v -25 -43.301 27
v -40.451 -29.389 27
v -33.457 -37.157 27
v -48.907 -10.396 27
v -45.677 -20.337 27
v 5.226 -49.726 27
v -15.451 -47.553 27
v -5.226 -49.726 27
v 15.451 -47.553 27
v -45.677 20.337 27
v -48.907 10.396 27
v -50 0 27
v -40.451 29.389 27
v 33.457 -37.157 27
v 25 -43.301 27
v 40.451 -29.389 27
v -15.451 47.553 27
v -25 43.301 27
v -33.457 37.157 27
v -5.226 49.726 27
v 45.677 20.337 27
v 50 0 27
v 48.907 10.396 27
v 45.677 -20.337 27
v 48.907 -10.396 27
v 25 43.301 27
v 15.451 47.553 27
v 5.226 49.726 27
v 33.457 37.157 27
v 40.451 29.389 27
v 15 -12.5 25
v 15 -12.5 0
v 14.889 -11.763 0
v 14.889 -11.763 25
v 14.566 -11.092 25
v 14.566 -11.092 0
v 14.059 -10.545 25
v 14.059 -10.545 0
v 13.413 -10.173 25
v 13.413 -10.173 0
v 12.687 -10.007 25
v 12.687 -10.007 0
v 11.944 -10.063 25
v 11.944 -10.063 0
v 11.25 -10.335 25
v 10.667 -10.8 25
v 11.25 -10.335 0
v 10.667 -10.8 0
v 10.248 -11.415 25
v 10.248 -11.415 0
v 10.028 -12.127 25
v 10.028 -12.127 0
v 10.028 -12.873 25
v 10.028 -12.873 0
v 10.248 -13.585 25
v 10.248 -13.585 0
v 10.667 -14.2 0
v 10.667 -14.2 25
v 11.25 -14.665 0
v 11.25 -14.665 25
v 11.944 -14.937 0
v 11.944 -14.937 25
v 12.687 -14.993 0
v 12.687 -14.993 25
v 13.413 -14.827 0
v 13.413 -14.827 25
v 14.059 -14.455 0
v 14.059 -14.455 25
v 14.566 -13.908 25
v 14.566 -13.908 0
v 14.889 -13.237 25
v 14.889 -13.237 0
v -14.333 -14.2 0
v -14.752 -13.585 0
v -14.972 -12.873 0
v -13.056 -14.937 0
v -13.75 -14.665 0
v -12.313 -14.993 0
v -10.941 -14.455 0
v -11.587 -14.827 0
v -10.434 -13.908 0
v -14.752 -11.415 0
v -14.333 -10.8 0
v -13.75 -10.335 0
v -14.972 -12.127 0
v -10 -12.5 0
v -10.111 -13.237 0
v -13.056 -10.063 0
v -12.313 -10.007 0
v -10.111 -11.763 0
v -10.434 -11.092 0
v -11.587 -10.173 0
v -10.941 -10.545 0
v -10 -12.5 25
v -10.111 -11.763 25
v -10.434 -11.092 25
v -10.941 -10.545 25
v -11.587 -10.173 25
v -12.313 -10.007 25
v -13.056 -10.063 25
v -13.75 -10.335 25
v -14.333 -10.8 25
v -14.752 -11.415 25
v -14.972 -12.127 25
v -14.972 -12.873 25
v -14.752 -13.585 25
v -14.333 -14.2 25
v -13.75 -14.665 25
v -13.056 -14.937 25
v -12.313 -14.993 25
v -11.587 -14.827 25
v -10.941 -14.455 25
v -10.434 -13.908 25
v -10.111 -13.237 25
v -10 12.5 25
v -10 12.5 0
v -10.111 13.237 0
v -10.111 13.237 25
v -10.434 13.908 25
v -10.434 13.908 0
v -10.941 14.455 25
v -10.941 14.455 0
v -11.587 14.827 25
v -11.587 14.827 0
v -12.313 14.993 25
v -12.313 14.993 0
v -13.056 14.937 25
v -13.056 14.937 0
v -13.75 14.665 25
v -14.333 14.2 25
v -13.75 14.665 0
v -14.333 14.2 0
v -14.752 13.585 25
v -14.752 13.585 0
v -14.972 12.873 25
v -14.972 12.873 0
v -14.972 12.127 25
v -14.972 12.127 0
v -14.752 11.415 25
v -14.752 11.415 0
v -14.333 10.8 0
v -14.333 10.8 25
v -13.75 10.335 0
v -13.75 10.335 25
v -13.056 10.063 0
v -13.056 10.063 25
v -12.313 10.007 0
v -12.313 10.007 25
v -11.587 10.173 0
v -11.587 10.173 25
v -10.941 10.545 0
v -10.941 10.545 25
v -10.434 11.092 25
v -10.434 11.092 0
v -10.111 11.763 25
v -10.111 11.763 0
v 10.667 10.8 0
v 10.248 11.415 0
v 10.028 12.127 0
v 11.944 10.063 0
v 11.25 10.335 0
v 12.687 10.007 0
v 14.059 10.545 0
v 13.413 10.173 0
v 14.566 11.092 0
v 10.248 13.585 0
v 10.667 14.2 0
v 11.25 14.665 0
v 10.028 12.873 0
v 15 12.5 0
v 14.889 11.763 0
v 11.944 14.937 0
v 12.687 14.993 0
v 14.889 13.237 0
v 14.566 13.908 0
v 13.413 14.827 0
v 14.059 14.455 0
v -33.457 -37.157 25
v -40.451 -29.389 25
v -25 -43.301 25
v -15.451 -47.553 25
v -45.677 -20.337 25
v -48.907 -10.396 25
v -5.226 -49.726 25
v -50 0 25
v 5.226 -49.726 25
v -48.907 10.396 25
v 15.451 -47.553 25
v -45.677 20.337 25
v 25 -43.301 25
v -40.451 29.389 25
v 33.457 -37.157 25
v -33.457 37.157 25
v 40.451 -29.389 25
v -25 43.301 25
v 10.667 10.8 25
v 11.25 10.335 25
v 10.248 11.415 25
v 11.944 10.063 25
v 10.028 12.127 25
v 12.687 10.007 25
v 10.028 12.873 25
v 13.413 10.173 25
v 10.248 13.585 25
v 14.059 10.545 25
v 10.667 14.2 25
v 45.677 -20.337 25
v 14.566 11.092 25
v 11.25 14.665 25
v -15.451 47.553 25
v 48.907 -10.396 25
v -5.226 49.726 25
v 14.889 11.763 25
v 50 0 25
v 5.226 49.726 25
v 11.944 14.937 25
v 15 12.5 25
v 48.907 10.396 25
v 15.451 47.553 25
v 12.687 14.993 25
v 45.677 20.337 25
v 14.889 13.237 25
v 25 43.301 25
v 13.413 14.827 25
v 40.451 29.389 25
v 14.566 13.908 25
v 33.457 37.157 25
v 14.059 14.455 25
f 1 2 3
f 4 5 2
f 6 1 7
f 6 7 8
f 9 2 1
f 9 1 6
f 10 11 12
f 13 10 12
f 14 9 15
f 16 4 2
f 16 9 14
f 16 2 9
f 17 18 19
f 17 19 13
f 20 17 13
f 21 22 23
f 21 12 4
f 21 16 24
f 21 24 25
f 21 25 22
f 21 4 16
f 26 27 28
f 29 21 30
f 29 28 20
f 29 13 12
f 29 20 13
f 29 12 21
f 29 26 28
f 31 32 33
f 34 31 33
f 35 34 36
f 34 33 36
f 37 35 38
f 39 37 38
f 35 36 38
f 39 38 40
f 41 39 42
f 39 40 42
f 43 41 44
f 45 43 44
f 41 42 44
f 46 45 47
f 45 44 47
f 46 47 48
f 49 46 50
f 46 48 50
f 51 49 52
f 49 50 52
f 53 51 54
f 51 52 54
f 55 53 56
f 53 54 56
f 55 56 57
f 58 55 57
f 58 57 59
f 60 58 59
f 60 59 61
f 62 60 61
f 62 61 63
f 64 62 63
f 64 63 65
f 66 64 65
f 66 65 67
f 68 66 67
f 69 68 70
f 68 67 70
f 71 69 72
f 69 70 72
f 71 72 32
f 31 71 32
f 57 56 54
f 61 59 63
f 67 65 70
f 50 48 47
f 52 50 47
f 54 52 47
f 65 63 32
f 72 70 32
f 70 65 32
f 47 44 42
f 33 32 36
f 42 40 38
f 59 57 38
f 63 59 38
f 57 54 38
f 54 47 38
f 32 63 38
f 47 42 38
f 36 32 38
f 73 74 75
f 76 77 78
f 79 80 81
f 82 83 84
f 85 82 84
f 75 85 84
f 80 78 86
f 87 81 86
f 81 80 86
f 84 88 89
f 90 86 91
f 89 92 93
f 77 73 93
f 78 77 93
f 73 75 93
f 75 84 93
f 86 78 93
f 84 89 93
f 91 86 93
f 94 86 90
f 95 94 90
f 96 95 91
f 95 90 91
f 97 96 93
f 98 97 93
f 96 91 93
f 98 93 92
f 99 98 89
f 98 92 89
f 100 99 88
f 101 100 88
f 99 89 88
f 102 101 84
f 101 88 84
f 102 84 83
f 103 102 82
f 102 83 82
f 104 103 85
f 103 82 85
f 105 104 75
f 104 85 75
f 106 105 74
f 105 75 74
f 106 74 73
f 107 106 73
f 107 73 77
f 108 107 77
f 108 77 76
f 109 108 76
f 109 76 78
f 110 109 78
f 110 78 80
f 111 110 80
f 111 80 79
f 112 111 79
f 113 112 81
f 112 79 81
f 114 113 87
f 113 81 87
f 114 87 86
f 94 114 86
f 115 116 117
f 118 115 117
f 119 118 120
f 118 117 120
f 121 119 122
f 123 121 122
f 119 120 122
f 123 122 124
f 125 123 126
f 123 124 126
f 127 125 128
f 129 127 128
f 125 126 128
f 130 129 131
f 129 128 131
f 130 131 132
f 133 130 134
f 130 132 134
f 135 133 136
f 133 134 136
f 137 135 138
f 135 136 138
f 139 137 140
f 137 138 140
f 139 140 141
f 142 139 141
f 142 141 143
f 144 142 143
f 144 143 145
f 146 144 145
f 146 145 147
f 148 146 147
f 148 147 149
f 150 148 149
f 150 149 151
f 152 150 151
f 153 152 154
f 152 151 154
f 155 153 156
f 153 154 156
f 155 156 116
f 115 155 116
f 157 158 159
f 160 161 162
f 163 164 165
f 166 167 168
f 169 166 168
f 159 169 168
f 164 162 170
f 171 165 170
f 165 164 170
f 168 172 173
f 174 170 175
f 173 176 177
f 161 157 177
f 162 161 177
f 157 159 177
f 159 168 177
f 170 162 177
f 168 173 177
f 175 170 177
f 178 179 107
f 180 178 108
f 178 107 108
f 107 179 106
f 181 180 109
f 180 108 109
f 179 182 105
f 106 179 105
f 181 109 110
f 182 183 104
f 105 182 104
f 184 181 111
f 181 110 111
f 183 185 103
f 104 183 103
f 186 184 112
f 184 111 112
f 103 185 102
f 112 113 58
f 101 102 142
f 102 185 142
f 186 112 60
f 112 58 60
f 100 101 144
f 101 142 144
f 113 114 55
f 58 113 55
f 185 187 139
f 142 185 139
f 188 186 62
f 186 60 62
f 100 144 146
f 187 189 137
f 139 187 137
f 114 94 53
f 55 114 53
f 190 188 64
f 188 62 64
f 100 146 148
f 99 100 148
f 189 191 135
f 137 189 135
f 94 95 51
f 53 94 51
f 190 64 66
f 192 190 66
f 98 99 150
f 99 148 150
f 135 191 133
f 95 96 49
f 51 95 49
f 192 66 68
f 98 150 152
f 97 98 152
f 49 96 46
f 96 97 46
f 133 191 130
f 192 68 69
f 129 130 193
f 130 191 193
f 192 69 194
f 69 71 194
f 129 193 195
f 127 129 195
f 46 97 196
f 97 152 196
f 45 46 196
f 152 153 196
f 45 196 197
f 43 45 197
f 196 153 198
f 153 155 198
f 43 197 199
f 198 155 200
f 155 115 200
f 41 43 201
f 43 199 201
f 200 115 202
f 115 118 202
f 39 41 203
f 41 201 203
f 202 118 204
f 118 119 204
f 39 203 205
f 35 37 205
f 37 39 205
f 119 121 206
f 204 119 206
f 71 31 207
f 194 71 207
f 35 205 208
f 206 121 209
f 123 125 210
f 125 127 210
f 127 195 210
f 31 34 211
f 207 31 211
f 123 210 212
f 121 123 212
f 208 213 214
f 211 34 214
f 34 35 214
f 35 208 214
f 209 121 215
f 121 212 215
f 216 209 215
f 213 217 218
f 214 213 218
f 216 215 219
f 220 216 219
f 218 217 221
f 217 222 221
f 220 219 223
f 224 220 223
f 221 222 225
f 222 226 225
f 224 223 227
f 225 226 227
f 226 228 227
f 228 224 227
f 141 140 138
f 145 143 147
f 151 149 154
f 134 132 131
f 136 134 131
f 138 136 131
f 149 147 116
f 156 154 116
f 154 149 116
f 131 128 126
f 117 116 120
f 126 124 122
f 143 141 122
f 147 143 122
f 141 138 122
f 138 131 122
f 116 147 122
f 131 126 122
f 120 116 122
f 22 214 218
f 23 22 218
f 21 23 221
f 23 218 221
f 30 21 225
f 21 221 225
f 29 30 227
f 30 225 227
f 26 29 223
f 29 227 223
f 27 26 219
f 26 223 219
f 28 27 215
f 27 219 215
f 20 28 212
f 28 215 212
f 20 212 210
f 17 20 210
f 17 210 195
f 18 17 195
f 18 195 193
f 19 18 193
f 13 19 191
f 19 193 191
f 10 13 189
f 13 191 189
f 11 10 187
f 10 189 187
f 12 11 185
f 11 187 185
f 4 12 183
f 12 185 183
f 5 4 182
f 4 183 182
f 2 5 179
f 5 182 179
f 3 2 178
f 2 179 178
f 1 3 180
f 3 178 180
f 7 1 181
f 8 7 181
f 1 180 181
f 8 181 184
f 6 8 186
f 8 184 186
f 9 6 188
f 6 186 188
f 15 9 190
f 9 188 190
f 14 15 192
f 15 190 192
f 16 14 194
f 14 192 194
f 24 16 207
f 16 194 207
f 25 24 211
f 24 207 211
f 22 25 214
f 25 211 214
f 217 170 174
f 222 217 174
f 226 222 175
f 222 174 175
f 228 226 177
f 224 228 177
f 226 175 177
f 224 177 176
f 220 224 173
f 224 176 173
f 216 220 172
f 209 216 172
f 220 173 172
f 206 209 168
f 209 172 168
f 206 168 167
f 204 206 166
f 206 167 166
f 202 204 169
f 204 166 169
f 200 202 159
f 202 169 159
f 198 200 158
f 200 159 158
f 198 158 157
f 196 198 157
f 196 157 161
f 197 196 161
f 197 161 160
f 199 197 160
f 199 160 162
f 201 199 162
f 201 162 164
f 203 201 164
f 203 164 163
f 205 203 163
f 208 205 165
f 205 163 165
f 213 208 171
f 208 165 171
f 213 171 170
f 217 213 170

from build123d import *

# Parameters (mm, degrees)
F0_R     = 2.5
F1_DEPTH = 25
F2_R     = 50
F2_R_2   = 2.5
F3_DEPTH = 25
F5_R     = 50
F5_R_2   = 2.5
F6_DEPTH = 2


with BuildPart() as f1:
    # F0 (on Top) → F1 (new body)
    with BuildSketch(Plane.XY):
        with Locations((12.5, 12.5)):
            Circle(F0_R)
        with Locations((-12.5, -12.5)):
            Circle(F0_R)
        with Locations((12.5, -12.5)):
            Circle(F0_R)
        with Locations((-12.5, 12.5)):
            Circle(F0_R)
    extrude(amount=F1_DEPTH)

    # F5 (on face) → F6 (join)
    with BuildSketch(Plane.XY.offset(25)):
        Circle(F5_R)
        with Locations((12.5, 12.5)):
            Circle(F5_R_2, mode=Mode.SUBTRACT)
        with Locations((12.5, 12.5)):
            Circle(F5_R_2)
    extrude(amount=F6_DEPTH)


with BuildPart() as f3:
    # F2 (on face) → F3 (new body)
    with BuildSketch(Plane.XY.offset(25)):
        Circle(F2_R)
        with Locations((12.5, 12.5)):
            Circle(F2_R_2, mode=Mode.SUBTRACT)
    extrude(amount=F3_DEPTH)


solid = f1.part
